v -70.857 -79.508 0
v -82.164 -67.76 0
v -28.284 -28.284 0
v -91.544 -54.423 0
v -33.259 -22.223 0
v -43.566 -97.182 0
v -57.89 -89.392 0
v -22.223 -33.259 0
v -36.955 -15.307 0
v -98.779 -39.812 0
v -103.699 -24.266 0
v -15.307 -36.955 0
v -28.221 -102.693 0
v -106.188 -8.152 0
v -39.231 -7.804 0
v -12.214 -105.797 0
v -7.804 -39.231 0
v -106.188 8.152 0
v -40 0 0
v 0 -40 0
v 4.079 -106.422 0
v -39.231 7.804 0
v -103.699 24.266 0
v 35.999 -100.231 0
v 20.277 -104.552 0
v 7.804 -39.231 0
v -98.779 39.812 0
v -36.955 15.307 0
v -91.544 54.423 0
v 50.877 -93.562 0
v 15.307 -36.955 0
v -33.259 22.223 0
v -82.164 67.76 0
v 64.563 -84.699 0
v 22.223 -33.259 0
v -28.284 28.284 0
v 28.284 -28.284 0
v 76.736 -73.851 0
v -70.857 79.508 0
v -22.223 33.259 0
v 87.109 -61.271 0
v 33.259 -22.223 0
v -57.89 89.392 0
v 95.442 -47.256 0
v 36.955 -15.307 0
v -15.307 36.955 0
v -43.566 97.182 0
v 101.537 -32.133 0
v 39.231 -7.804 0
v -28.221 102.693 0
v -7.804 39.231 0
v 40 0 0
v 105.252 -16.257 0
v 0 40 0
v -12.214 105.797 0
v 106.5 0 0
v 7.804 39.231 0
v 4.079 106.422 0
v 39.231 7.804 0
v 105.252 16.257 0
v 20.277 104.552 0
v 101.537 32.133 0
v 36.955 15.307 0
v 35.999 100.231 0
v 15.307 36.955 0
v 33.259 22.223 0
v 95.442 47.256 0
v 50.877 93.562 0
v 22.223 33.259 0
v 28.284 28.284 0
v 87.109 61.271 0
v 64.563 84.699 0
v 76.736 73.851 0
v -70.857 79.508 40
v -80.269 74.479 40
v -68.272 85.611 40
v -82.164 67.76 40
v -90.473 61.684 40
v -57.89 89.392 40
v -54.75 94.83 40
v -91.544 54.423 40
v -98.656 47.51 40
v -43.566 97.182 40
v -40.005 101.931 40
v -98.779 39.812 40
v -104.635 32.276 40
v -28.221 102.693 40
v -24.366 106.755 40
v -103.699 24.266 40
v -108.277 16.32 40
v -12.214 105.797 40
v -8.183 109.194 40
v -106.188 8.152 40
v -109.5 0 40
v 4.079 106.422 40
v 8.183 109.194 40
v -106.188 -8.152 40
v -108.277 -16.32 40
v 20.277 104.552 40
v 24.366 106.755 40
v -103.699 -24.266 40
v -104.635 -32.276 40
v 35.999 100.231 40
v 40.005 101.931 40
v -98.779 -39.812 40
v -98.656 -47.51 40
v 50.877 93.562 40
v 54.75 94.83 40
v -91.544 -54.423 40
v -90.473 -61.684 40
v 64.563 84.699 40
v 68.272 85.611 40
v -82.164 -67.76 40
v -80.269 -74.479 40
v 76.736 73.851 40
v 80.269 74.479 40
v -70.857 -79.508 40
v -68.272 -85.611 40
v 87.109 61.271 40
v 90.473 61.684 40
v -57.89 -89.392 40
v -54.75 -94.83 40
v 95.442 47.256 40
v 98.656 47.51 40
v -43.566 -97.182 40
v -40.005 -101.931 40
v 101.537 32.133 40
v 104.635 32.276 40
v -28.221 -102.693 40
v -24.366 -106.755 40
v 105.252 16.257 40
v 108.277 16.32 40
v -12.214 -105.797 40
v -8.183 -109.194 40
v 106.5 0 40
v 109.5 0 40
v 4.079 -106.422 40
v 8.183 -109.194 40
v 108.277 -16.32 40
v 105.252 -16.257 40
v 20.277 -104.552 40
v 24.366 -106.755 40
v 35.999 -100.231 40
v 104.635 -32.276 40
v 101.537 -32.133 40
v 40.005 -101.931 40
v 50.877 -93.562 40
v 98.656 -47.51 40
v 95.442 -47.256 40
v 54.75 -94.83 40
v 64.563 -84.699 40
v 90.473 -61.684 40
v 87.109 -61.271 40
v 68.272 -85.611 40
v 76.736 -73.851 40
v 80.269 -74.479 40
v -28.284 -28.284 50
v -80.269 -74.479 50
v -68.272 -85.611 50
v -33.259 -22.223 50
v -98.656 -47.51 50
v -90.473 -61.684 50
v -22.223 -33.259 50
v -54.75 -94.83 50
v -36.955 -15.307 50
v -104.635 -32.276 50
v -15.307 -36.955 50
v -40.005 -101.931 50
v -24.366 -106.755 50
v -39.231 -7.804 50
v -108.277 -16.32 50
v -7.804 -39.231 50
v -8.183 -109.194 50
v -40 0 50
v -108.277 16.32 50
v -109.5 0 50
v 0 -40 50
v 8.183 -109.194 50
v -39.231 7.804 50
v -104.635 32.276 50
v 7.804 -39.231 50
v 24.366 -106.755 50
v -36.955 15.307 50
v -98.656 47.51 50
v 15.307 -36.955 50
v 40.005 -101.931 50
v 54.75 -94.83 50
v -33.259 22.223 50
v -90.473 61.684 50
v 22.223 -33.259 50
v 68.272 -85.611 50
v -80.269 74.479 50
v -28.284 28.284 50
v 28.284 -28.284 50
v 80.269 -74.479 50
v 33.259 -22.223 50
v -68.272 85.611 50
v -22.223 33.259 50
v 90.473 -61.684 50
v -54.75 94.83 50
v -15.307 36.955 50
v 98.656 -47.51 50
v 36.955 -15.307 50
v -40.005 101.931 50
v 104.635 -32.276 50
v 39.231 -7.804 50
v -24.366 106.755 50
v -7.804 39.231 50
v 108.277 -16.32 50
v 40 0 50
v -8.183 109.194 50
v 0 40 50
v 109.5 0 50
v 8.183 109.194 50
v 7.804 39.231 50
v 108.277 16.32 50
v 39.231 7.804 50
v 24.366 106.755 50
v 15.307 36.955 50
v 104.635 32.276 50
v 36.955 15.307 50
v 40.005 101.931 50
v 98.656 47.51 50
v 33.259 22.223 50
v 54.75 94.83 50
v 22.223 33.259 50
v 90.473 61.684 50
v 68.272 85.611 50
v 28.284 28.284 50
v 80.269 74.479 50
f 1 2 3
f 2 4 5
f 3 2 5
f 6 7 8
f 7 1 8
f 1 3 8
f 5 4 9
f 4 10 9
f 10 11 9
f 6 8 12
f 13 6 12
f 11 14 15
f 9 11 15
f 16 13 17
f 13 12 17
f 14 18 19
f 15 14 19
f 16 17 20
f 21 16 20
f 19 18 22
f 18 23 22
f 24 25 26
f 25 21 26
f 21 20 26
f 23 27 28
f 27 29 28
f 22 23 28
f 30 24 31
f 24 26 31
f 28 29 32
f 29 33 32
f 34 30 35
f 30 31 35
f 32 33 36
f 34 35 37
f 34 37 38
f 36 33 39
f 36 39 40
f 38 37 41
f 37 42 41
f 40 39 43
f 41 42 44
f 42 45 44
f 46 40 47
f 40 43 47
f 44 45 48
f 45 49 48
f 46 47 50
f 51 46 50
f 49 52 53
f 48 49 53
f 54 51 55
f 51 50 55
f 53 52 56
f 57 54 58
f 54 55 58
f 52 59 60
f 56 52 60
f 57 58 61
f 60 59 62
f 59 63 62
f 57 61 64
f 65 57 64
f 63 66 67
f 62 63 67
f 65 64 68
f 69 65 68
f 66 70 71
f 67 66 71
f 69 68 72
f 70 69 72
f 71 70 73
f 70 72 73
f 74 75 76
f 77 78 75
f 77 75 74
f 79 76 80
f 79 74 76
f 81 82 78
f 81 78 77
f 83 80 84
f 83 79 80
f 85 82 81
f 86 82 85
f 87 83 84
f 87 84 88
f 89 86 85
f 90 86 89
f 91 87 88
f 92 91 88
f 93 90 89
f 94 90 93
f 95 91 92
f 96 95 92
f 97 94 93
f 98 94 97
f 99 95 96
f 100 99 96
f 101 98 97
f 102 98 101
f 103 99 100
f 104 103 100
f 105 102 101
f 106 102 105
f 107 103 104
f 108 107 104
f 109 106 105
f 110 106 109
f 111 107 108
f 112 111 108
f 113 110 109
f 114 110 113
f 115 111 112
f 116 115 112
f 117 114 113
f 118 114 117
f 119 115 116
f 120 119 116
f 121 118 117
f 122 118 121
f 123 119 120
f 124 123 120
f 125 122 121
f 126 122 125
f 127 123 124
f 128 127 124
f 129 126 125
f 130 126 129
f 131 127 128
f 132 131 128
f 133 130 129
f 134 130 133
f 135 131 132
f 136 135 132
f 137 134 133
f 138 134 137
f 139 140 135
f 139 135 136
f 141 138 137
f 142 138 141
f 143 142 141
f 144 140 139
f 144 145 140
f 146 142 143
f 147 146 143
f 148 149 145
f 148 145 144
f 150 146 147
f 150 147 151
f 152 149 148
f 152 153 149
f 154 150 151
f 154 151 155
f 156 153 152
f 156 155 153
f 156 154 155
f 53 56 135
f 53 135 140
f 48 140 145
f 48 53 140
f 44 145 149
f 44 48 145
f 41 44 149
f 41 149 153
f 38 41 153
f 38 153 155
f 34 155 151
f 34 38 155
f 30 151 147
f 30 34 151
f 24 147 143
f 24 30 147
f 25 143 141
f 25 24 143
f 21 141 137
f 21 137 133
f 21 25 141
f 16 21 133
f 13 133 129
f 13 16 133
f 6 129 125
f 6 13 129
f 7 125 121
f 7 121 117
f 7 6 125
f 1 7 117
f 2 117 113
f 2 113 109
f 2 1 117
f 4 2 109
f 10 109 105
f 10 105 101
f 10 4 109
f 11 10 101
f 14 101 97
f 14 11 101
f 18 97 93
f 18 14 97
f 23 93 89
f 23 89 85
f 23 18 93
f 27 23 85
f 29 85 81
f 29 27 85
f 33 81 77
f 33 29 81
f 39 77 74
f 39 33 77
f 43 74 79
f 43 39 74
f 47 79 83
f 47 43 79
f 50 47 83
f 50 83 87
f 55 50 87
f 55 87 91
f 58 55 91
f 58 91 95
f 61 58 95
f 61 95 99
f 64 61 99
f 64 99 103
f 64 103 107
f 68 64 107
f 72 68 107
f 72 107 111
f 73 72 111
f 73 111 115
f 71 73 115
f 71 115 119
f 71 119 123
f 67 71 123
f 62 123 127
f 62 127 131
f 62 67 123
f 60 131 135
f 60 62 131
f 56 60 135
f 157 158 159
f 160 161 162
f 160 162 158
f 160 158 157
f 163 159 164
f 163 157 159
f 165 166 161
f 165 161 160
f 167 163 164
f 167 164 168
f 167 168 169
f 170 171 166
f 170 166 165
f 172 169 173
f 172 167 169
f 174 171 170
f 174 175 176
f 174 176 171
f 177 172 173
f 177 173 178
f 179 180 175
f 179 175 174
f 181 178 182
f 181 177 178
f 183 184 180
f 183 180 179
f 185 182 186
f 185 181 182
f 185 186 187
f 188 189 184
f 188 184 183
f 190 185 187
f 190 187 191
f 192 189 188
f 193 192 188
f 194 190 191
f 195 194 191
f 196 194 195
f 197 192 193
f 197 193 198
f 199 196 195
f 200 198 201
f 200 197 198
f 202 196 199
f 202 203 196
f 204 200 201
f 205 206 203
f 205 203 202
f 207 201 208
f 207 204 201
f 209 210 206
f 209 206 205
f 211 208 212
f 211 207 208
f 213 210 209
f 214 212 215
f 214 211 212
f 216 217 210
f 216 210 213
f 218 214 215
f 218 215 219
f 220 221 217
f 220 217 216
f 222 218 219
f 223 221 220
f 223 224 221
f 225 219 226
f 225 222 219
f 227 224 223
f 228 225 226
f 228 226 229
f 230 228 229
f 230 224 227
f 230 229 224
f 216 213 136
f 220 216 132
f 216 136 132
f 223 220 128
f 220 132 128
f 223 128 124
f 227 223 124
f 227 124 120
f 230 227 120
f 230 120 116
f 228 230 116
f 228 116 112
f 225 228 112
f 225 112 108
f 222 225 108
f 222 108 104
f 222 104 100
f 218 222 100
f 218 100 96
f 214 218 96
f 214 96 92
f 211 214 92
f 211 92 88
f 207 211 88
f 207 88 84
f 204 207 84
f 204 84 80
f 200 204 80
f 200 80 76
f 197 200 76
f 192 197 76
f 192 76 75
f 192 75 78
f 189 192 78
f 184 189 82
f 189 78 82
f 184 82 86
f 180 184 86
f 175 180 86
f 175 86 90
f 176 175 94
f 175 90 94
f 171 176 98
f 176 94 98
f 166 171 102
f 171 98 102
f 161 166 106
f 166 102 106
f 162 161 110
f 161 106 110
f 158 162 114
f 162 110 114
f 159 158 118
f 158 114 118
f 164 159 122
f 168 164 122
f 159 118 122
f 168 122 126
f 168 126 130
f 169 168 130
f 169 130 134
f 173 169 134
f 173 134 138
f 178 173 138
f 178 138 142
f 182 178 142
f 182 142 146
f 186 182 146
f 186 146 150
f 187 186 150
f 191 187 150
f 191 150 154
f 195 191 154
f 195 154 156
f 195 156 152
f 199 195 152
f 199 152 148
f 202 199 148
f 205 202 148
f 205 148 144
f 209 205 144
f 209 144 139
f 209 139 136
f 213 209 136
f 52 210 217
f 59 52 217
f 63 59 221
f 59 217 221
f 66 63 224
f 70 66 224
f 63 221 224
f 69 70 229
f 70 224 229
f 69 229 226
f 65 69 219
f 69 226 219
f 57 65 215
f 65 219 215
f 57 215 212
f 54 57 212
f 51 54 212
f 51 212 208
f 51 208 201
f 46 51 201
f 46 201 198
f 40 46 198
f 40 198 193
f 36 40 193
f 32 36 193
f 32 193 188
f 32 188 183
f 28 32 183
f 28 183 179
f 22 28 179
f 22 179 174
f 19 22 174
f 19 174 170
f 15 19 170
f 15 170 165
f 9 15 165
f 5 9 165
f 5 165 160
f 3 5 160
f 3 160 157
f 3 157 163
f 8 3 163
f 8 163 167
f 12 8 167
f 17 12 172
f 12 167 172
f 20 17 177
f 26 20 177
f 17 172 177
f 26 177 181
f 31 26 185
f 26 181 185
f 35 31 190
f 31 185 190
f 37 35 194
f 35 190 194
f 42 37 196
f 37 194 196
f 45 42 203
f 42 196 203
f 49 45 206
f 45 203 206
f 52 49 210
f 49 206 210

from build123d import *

# Parameters (mm, degrees)
F0_R     = 109.5
F1_DEPTH = 50
F2_R     = 109.5
F2_R_2   = 106.5
F3_DEPTH = 40
F4_R     = 40
F5_DEPTH = 50.001


with BuildPart() as f1:
    # F0 (on Top) → F1 (new body)
    with BuildSketch(Plane.XY):
        Circle(F0_R)
    extrude(amount=F1_DEPTH)

    # F2 (on face) → F3 (cut)
    with BuildSketch(Plane(origin=(0, 0, 0), x_dir=(1, 0, 0), z_dir=(0, 0, -1))):
        Circle(F2_R)
        Circle(F2_R_2, mode=Mode.SUBTRACT)
    extrude(amount=-F3_DEPTH, mode=Mode.SUBTRACT)

    # F4 (on face) → F5 (cut, through all)
    with BuildSketch(Plane.XY.offset(50)):
        Circle(F4_R)
    extrude(amount=-F5_DEPTH, mode=Mode.SUBTRACT)


solid = f1.part
